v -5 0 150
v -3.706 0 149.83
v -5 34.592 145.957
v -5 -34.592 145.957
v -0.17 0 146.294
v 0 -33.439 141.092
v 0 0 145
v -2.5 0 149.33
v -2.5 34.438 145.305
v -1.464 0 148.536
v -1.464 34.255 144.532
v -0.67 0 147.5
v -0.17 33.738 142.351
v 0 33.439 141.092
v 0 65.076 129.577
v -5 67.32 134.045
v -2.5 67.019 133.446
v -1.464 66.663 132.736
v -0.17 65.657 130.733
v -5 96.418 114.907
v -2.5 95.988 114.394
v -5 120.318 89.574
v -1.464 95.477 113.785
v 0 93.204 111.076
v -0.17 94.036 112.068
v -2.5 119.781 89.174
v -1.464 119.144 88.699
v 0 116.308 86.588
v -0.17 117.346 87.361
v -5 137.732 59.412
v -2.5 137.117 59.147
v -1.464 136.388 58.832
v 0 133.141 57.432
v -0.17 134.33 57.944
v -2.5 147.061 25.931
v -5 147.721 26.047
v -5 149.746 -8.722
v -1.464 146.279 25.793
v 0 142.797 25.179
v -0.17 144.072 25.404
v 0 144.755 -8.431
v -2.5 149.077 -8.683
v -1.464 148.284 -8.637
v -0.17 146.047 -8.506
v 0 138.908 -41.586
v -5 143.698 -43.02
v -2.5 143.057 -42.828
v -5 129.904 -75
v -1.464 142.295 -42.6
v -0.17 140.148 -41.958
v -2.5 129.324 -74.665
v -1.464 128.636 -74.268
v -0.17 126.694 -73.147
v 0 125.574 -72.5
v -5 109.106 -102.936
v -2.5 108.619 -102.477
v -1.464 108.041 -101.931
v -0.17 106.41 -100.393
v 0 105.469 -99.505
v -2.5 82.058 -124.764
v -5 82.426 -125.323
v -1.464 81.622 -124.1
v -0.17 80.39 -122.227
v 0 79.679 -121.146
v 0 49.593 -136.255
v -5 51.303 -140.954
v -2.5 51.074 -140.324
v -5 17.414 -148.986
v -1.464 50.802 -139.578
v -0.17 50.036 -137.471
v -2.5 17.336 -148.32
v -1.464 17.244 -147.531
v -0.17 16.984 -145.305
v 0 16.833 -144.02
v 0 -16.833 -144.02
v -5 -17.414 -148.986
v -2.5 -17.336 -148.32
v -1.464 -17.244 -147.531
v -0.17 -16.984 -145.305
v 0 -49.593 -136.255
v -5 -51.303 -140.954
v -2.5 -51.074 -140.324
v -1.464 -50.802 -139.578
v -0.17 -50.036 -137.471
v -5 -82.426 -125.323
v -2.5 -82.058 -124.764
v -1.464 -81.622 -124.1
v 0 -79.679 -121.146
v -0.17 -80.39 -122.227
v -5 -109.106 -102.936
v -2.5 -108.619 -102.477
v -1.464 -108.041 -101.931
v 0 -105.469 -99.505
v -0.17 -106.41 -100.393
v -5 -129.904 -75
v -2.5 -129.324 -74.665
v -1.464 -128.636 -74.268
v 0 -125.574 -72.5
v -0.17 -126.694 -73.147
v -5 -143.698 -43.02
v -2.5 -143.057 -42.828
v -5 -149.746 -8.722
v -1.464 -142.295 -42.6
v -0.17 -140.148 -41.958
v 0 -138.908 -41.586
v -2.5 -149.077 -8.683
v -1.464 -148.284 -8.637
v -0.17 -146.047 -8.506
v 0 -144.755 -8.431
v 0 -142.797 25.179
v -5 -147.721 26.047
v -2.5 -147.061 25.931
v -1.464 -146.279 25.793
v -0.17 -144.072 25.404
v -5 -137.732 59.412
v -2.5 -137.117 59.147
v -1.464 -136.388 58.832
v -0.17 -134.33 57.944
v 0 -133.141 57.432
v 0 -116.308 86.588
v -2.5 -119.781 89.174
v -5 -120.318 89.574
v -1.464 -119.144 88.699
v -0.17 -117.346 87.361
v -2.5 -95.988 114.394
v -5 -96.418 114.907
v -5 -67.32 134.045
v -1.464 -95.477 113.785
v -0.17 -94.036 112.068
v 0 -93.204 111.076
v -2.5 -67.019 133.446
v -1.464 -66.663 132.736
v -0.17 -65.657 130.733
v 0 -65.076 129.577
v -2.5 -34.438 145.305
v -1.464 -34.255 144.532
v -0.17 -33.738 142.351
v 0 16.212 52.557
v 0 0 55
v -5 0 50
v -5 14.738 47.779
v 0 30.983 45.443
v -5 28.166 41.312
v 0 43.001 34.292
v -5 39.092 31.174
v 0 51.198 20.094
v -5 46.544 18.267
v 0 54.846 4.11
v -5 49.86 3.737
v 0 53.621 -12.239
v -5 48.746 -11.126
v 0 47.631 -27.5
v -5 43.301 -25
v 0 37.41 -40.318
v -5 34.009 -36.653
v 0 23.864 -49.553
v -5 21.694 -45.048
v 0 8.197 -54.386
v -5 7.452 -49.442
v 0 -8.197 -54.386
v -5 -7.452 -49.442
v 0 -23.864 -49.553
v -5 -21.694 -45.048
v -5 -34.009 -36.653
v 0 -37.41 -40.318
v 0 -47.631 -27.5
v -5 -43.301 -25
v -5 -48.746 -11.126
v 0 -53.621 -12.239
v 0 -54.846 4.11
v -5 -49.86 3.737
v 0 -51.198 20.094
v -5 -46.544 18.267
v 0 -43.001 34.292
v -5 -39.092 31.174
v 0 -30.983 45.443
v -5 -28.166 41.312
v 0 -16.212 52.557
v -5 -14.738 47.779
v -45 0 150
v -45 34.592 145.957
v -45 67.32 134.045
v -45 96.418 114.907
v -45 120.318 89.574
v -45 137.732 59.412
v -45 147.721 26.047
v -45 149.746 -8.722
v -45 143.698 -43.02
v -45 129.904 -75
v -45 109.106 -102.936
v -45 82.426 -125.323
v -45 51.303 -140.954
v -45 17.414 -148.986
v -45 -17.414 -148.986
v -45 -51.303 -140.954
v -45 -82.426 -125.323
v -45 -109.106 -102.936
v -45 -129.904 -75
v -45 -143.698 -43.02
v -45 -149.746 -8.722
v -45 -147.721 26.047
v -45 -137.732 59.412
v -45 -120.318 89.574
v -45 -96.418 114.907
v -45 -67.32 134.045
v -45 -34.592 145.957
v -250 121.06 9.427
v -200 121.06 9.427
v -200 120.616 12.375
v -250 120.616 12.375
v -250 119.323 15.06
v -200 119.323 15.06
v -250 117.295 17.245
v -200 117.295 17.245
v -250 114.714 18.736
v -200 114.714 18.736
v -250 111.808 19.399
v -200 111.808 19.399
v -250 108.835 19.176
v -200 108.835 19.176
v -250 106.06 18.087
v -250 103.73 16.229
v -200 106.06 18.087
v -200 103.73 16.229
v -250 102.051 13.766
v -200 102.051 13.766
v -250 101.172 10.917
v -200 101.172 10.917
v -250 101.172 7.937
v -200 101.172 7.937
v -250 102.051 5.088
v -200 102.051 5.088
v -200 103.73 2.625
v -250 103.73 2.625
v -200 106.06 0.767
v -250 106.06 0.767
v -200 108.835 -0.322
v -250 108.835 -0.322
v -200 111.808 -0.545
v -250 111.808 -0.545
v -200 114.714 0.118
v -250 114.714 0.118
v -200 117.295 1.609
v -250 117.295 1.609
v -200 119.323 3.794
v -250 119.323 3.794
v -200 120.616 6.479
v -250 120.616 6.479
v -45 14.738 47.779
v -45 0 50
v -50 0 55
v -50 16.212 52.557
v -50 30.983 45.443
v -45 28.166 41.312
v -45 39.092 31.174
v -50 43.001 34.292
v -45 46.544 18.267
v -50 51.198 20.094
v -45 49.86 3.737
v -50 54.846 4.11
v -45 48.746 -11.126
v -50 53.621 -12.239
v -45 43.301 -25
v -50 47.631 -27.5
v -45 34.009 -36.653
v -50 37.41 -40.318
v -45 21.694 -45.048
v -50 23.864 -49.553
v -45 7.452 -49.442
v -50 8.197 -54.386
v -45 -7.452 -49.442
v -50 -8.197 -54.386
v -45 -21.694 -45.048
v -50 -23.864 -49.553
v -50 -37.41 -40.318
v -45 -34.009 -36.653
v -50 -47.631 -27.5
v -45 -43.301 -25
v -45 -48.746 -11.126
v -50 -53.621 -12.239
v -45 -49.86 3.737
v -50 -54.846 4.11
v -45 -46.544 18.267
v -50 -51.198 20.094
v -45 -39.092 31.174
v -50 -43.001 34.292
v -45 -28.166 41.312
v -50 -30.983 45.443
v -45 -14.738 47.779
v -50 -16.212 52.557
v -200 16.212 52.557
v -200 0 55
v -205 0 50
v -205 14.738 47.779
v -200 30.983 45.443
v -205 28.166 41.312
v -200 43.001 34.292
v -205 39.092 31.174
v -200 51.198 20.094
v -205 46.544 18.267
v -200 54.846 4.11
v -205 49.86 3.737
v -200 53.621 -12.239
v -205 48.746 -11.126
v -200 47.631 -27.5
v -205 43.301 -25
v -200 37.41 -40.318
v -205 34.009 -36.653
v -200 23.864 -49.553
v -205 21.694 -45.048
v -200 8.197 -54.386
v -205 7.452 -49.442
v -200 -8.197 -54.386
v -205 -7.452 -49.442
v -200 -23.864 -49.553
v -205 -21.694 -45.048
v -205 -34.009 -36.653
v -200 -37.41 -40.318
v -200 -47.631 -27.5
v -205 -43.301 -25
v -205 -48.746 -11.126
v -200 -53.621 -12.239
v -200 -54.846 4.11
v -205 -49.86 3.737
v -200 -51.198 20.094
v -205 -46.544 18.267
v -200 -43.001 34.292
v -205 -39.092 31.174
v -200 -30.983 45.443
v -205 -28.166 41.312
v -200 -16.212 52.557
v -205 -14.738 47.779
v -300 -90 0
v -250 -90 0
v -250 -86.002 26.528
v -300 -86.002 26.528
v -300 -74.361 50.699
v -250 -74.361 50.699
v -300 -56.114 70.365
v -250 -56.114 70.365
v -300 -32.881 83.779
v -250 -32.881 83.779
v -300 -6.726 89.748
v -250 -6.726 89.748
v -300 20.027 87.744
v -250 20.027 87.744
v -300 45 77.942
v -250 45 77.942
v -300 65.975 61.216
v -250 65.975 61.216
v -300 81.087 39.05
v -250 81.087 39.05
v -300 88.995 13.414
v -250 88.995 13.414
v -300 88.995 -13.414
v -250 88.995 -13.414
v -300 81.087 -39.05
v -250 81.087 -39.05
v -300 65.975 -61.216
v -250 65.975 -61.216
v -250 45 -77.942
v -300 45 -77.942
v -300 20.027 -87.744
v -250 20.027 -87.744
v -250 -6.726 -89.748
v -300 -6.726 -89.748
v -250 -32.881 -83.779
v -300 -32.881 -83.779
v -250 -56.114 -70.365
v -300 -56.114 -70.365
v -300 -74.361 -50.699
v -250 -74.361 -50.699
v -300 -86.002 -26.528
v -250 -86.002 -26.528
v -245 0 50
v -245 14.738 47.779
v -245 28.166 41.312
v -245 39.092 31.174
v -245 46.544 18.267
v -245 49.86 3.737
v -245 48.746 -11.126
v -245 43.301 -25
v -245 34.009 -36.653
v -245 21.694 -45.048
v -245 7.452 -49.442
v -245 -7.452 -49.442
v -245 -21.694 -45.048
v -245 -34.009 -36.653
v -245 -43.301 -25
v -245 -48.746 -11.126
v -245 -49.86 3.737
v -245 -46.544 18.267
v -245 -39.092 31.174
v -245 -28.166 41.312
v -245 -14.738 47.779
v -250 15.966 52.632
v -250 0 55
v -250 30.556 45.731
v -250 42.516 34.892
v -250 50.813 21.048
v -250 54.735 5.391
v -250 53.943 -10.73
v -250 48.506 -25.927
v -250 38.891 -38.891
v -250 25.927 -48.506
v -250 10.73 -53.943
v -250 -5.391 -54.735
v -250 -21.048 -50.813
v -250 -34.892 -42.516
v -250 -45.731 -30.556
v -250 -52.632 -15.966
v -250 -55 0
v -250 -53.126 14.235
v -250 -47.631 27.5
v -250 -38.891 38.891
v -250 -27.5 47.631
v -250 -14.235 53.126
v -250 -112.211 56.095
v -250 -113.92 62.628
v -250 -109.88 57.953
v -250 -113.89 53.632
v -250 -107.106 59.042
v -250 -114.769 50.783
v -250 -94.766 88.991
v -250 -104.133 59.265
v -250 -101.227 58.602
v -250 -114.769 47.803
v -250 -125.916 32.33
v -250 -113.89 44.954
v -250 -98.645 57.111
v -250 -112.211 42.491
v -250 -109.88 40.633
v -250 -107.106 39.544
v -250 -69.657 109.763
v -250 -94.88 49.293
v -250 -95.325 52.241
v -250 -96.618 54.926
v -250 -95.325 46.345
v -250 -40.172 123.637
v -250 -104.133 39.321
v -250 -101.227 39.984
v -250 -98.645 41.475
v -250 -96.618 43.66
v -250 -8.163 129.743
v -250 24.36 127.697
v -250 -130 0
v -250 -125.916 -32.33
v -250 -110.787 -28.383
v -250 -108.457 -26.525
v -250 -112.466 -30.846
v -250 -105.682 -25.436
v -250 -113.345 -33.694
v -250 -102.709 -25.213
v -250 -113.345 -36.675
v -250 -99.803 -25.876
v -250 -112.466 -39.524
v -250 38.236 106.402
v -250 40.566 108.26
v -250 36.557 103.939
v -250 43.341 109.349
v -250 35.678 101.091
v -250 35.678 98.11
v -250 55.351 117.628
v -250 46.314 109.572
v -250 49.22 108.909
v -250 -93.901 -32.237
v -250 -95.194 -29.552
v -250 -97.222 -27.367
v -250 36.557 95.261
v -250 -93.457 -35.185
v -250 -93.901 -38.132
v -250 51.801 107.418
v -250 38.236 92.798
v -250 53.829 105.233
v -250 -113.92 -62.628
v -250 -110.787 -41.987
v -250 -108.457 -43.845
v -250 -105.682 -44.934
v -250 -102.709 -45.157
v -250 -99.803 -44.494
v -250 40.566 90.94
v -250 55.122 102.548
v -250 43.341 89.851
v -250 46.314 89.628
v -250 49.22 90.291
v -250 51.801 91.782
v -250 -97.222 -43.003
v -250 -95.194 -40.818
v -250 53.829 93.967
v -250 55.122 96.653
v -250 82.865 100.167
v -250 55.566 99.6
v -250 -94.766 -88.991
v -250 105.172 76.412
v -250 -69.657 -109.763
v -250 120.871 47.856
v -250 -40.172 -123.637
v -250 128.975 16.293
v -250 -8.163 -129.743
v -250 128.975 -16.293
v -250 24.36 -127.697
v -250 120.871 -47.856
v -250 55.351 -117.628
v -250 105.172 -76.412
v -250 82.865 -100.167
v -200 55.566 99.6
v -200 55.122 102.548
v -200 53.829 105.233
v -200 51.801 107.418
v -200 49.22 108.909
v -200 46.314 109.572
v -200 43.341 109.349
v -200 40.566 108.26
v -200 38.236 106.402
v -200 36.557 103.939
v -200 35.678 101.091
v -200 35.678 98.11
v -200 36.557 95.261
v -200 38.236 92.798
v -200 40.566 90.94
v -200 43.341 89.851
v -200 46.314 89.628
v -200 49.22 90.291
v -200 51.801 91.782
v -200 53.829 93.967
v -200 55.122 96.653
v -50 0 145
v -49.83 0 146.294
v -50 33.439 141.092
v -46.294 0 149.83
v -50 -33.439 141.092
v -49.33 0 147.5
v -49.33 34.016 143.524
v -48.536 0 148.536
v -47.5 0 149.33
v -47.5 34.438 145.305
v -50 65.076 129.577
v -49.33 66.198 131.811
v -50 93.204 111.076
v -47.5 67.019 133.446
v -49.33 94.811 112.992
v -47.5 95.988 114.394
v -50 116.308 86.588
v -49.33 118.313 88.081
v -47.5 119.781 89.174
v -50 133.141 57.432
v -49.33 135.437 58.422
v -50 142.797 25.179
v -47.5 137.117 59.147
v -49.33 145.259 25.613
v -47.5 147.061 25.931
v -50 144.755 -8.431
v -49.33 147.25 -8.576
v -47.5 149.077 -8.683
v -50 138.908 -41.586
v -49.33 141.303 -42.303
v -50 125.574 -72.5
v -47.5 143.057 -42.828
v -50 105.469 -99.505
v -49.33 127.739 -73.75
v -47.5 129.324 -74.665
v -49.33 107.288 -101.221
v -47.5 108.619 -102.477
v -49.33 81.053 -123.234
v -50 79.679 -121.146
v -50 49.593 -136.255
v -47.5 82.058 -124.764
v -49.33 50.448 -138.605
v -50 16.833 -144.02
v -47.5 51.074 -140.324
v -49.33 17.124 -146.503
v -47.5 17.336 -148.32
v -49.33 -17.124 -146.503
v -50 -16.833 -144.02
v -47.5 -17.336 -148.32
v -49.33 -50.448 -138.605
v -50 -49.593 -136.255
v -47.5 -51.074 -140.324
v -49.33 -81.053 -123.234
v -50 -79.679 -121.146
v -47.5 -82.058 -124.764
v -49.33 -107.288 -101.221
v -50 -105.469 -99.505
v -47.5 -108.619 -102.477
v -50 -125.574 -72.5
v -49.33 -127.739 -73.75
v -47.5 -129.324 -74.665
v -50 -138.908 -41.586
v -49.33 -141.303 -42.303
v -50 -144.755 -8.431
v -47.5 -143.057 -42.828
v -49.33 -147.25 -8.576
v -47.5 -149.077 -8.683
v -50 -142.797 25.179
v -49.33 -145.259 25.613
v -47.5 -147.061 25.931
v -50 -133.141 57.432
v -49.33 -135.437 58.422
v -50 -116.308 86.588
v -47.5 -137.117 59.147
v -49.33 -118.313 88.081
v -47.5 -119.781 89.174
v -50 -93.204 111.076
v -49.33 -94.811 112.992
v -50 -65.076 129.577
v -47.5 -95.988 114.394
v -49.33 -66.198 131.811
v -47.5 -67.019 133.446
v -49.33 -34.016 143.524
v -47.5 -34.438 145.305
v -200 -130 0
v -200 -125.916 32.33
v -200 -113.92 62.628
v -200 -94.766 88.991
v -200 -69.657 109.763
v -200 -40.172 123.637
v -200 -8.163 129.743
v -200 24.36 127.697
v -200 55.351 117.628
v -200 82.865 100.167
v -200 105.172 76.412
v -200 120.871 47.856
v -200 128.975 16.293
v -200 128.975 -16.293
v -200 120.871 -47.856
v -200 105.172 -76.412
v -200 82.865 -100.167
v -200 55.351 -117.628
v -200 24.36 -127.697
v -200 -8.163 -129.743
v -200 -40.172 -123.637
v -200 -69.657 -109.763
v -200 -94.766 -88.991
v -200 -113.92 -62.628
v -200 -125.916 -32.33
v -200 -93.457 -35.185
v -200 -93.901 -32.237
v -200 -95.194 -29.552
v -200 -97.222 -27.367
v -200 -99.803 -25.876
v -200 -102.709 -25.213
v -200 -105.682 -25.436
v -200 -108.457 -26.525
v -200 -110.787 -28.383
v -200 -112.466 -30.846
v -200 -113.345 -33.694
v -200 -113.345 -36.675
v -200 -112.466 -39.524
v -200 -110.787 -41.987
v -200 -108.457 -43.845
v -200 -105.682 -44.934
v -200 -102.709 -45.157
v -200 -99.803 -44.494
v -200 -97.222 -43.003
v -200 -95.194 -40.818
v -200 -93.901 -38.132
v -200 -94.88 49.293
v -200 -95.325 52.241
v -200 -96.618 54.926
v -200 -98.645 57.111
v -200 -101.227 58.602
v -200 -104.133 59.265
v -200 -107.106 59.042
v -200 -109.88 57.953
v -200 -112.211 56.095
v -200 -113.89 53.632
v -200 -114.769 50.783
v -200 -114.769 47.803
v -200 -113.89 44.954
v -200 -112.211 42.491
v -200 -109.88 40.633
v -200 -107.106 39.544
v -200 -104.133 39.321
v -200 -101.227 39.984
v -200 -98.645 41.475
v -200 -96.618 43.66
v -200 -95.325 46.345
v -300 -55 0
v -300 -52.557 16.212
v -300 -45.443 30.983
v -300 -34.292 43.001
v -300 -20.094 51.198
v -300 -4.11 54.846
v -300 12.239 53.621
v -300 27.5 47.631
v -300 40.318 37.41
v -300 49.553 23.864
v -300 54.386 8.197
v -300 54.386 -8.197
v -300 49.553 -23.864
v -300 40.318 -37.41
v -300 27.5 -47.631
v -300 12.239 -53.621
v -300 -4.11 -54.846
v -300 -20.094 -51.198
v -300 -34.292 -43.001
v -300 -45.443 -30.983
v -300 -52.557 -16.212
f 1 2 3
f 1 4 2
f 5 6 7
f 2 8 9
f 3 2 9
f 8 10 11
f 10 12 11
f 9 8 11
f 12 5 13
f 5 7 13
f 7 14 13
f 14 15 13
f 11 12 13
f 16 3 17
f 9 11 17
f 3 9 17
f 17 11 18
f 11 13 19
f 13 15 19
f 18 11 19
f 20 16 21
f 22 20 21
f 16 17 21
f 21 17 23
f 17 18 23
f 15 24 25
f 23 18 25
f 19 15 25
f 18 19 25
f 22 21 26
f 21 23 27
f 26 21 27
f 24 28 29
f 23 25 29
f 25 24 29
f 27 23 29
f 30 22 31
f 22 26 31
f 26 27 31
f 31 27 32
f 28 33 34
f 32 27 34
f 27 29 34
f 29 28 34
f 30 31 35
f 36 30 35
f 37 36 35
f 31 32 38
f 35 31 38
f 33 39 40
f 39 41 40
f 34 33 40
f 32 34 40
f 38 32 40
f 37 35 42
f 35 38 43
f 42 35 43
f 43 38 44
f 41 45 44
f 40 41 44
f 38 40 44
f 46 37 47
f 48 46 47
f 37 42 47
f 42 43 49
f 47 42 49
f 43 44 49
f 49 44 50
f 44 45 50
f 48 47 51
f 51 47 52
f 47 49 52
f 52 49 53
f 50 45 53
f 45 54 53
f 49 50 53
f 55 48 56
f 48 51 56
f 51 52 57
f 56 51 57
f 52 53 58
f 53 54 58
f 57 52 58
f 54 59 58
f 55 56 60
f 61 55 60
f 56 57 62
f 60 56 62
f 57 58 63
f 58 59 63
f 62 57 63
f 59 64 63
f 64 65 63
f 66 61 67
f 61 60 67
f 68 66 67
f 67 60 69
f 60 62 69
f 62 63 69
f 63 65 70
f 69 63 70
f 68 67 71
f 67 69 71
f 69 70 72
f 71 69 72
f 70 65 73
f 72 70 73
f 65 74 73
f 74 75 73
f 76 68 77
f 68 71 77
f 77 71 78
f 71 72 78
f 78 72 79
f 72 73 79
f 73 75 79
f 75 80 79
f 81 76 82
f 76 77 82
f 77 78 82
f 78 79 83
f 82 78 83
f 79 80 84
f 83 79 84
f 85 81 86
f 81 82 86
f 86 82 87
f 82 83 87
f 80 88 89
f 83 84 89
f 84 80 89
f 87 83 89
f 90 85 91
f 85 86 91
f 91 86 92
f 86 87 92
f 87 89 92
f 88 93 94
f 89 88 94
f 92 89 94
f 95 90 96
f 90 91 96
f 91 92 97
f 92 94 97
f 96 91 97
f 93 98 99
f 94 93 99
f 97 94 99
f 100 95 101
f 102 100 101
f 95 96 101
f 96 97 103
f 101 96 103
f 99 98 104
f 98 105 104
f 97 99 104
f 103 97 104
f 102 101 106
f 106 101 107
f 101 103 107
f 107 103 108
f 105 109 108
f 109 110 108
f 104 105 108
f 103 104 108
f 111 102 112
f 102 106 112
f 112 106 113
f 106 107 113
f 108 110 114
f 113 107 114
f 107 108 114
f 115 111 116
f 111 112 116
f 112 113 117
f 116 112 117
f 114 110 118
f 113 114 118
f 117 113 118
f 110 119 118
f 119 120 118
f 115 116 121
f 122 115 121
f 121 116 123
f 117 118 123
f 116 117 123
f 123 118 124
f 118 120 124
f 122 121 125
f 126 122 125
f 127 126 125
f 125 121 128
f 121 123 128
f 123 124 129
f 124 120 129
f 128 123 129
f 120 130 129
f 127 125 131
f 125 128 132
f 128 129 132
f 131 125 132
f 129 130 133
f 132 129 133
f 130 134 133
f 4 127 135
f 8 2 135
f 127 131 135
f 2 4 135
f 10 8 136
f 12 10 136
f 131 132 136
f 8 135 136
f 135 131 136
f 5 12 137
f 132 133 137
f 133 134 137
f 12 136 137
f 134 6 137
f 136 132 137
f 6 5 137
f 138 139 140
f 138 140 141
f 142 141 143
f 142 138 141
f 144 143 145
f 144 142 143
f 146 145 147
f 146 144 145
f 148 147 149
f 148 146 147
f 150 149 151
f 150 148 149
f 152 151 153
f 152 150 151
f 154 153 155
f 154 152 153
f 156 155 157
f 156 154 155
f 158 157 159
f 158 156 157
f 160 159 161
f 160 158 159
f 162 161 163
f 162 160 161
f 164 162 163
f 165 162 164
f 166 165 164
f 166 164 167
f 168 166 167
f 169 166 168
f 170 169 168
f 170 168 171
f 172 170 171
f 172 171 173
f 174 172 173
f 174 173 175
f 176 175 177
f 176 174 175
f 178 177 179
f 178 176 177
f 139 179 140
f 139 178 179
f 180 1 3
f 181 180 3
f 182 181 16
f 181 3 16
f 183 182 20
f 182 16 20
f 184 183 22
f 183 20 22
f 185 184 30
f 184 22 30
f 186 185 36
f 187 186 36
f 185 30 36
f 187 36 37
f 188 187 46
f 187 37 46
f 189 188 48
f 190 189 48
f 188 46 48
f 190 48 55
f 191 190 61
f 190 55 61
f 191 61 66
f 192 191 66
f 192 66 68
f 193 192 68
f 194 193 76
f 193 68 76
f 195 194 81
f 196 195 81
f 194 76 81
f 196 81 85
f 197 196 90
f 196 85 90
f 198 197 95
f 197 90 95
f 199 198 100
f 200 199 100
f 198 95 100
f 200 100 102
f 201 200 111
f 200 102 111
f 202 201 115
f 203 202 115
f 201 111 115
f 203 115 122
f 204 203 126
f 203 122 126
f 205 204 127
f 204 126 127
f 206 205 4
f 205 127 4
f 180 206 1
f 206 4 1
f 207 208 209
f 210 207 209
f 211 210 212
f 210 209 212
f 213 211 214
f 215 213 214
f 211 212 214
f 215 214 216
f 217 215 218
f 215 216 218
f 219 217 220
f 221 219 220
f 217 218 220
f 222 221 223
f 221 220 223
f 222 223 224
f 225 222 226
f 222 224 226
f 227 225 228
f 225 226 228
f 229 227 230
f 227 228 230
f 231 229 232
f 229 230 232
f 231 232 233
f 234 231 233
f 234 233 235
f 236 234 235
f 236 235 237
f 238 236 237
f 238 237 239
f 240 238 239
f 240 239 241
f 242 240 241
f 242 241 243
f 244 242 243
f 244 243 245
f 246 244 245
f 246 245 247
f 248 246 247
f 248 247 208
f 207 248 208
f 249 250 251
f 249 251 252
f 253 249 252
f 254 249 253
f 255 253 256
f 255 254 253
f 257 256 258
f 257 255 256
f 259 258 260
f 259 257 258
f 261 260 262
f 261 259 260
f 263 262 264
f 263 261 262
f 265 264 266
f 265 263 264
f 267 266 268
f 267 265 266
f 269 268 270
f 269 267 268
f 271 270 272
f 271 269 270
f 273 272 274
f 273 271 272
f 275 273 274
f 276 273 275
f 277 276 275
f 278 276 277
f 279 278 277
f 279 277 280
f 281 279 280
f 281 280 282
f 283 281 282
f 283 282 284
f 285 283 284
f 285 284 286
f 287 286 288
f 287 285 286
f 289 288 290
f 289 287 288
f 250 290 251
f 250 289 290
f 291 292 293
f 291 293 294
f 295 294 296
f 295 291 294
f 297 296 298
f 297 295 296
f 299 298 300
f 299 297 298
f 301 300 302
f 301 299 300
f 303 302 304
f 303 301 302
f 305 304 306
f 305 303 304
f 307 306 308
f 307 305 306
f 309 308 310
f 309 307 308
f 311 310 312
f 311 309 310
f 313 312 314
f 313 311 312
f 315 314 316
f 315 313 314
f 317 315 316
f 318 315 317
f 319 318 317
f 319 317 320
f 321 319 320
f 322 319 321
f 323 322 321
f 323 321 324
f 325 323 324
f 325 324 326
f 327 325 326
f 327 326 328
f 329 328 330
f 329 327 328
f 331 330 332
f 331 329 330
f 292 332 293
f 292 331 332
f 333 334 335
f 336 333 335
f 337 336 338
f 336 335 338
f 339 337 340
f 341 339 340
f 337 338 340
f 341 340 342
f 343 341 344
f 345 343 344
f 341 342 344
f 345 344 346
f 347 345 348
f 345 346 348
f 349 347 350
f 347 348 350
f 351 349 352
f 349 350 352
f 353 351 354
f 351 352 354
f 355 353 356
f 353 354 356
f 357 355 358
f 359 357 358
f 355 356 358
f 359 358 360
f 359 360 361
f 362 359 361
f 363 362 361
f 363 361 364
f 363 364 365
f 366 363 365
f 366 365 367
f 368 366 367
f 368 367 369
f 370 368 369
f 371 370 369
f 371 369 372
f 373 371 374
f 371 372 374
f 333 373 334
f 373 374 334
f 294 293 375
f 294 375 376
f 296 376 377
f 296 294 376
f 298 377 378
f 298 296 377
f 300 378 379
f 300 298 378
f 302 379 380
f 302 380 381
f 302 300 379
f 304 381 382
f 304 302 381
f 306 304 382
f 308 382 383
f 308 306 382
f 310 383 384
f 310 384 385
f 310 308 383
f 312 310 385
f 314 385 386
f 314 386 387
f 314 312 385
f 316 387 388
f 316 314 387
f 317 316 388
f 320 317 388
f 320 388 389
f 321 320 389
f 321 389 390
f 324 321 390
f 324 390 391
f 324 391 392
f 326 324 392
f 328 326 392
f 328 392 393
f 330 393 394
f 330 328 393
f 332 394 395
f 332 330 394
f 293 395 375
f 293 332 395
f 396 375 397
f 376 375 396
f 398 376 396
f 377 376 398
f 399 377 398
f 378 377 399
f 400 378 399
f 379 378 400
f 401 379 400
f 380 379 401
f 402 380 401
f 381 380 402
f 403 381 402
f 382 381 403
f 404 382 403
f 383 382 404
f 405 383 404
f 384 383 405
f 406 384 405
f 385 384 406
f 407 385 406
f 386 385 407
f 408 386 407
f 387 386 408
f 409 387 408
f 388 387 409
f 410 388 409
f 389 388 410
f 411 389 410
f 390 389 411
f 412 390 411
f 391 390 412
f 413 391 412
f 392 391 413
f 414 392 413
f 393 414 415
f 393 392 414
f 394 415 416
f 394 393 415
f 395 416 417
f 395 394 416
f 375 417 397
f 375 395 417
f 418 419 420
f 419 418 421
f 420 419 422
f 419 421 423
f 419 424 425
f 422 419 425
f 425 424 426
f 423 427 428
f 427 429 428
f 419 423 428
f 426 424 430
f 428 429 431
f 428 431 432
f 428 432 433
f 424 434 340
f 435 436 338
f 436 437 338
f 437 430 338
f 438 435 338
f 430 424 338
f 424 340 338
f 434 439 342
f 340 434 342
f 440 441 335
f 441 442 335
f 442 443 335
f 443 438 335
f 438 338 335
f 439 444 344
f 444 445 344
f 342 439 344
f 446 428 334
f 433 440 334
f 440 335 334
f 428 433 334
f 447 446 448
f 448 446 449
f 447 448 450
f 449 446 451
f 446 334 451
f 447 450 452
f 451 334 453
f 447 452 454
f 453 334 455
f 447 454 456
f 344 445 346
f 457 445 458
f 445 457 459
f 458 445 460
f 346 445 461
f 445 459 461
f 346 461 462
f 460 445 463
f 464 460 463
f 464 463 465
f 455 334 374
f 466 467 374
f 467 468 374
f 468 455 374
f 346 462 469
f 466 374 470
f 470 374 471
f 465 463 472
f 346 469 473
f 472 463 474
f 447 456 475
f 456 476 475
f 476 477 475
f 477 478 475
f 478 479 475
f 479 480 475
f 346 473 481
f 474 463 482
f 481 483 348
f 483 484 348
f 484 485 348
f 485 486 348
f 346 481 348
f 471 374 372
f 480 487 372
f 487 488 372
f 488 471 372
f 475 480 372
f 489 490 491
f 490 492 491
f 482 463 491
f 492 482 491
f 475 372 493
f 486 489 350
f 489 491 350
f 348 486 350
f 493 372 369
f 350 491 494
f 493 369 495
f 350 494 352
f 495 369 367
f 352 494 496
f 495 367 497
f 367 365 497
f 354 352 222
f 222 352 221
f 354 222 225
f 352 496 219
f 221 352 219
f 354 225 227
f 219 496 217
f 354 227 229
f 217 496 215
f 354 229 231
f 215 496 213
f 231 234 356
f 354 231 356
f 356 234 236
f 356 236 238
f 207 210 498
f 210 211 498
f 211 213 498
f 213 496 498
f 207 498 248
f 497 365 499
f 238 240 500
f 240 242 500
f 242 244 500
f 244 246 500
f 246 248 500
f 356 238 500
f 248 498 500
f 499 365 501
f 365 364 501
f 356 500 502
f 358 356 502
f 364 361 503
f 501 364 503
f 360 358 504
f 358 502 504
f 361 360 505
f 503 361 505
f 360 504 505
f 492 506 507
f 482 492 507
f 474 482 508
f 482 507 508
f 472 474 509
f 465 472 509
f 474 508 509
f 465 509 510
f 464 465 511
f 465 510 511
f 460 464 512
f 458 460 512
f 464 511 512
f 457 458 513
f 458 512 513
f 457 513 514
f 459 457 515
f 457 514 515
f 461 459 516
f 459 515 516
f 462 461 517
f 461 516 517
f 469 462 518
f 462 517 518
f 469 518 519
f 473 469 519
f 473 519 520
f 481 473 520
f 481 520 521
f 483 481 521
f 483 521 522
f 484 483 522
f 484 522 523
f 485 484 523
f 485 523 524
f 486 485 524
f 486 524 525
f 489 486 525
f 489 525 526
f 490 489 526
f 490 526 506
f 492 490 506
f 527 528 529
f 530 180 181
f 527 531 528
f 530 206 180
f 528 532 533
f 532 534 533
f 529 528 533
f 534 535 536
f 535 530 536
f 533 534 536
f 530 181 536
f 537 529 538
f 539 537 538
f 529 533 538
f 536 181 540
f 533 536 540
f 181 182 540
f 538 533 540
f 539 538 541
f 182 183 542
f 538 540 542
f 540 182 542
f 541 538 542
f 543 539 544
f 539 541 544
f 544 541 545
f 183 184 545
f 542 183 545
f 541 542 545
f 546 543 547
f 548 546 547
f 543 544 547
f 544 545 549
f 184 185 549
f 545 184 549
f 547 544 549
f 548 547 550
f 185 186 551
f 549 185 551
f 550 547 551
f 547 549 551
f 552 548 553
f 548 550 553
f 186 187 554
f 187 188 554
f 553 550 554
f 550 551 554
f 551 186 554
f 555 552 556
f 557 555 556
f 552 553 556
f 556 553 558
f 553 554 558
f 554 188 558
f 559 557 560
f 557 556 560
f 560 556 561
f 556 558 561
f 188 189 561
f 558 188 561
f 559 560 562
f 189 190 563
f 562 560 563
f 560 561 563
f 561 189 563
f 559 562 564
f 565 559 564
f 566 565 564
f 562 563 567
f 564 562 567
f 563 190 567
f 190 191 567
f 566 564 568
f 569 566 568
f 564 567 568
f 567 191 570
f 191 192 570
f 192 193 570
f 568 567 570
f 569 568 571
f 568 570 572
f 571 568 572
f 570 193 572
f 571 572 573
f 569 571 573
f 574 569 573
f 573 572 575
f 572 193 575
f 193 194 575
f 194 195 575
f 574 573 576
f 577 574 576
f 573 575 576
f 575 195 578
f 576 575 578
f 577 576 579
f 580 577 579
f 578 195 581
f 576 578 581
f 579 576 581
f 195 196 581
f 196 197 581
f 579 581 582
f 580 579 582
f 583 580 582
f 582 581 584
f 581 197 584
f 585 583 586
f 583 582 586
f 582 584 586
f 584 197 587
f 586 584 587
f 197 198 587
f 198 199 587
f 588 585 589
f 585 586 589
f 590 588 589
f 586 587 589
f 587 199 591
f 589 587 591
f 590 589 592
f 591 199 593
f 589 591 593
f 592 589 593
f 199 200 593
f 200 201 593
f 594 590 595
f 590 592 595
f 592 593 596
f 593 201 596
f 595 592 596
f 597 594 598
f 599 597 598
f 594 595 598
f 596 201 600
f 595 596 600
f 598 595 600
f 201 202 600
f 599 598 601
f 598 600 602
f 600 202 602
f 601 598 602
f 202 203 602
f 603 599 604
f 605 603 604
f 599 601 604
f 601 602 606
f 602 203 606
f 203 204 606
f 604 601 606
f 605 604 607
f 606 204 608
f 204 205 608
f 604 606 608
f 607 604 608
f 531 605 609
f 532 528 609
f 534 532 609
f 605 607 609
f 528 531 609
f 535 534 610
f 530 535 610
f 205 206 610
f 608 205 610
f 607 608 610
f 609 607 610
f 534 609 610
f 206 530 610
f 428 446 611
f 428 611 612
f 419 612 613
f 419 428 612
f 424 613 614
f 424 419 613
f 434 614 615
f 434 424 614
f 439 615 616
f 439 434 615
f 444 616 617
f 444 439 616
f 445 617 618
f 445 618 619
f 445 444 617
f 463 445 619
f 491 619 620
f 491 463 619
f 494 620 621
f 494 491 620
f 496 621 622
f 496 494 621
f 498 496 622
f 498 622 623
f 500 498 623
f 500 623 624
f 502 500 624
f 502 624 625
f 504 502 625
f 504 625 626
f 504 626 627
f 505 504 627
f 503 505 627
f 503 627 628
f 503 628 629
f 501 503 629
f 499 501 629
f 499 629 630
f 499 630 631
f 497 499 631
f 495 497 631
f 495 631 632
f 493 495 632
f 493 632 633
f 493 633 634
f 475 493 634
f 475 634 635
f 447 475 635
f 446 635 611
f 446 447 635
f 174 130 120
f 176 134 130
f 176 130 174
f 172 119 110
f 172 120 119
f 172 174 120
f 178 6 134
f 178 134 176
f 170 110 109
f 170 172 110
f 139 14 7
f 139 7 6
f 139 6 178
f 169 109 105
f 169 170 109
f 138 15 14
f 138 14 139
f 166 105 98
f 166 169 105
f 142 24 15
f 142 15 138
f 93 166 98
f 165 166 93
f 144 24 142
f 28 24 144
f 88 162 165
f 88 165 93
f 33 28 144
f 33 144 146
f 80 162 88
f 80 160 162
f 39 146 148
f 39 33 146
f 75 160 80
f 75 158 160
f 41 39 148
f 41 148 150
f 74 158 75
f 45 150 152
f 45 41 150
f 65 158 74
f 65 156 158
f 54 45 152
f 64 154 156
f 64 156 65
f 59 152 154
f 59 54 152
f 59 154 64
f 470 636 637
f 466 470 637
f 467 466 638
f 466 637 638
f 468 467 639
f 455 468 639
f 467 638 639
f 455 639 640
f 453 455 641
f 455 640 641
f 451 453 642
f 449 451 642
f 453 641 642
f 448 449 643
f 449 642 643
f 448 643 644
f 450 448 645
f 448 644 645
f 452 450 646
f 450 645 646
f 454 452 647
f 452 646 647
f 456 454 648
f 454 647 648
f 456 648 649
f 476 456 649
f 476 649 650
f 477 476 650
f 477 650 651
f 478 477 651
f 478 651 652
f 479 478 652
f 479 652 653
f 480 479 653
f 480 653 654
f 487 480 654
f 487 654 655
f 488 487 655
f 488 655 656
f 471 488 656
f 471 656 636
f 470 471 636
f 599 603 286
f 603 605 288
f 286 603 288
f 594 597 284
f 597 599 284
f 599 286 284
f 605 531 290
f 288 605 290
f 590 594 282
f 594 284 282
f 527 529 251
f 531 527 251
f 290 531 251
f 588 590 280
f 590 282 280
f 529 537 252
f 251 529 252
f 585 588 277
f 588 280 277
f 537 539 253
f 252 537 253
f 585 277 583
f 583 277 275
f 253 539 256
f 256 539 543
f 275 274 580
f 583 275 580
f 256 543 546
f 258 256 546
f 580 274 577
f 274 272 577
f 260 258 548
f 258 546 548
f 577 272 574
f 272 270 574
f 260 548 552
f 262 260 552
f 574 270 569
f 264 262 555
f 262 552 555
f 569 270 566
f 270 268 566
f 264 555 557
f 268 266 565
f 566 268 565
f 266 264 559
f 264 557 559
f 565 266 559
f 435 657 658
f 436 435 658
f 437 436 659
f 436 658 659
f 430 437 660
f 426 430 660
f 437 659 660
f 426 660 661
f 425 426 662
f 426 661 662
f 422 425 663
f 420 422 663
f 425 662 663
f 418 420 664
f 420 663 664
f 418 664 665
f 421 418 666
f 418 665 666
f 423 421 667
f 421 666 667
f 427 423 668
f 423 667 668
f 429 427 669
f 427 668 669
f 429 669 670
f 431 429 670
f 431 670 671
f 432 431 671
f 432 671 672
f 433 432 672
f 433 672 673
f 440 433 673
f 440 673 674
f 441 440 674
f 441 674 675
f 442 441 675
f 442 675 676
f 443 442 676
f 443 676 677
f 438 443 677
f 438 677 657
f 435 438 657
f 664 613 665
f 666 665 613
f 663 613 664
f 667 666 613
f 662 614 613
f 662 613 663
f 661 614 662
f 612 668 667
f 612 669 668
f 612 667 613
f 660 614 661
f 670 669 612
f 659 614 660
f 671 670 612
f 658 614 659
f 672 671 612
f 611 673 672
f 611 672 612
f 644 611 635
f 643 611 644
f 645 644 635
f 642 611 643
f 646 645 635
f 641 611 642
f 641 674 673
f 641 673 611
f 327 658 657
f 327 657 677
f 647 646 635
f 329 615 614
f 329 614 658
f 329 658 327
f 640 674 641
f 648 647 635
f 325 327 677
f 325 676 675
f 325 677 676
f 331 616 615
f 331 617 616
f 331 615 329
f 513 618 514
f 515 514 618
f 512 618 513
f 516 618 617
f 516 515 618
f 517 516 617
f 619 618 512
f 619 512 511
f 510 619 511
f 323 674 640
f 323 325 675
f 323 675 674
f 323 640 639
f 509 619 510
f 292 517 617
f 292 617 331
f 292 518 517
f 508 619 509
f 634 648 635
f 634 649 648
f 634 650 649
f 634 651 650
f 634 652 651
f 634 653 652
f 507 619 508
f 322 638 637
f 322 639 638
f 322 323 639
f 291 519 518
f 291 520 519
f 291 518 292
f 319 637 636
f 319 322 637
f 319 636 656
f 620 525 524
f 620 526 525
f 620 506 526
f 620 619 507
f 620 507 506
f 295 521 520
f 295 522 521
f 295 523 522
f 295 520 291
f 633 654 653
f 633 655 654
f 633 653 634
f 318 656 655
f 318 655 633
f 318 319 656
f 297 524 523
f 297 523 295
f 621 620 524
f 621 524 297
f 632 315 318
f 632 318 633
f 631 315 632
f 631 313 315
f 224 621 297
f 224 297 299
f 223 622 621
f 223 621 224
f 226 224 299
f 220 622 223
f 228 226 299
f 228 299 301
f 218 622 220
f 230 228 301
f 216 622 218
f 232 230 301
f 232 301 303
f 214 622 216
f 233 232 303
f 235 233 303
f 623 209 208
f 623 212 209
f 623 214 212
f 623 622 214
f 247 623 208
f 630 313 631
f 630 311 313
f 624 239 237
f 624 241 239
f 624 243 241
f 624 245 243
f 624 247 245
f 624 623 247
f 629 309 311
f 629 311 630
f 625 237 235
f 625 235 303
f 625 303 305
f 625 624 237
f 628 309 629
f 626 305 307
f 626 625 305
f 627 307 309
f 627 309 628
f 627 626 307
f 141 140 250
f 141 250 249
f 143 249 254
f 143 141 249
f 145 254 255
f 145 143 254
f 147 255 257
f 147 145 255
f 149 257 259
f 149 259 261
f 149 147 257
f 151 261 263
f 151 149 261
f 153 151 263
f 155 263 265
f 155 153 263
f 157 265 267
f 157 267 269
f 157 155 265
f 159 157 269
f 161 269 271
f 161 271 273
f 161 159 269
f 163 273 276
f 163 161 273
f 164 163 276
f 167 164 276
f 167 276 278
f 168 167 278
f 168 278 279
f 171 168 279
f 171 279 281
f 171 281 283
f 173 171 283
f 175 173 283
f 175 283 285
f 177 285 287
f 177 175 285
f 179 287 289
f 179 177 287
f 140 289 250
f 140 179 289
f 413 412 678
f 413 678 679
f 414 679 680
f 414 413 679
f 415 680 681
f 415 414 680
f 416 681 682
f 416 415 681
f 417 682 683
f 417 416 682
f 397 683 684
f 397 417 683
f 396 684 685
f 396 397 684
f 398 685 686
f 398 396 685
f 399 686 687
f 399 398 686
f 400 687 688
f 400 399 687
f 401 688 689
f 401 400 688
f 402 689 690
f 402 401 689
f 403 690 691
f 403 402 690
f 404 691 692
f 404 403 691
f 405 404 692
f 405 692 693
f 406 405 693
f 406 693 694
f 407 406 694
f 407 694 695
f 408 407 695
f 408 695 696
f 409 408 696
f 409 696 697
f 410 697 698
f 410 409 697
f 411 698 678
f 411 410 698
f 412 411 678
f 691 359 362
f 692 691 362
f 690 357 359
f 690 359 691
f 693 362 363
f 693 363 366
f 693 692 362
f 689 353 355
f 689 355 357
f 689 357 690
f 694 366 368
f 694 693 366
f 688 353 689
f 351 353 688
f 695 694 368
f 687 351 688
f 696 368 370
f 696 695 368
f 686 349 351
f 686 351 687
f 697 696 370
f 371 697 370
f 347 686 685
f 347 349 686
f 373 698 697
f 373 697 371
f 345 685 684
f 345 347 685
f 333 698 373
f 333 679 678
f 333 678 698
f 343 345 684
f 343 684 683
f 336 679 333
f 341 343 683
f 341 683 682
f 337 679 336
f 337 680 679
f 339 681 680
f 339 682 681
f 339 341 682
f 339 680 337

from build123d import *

# Parameters (mm, degrees)
F0_W     = 50
F0_H     = 100
F2_SIZE  = 5
F3_R     = 5
F5_R     = 90
F5_R_2   = 55
F6_DEPTH = 50
F5_R_3   = 175
F5_R_4   = 145
F5_R_5   = 130
F7_DEPTH = 250.001
F8_D     = 20


with BuildPart() as f1:
    # F0 (on Front) → F1 (revolve)
    with BuildSketch(Plane.XZ):
        with Locations((-25, 100)):
            Rectangle(F0_W, F0_H)
    revolve(axis=Axis((-17.4827627066, 0, 0), (-1, 0, 0)))

    # F2
    f2_edges = [f1.edges().sort_by_distance(p)[0] for p in [
        (-50, 0, -50),
        (0, 0, -50),
        (-25, 0, 50),
    ]]
    chamfer(f2_edges, length=F2_SIZE)

    # F3
    f3_edges = [f1.edges().sort_by_distance(p)[0] for p in [
        (0, 0, -150),
        (-50, 0, -150),
        (-25, 0, 150),
    ]]
    fillet(f3_edges, radius=F3_R)


with BuildPart() as f4_1:
    # F4: copy of F1
    add(f1.part.moved(Location((-200, 0, 0))))

    # F5 (on face) → F6 (join)
    with BuildSketch(Plane(origin=(-250, 0, 0), x_dir=(0, -1, 0), z_dir=(-1, 0, 0))):
        Circle(F5_R)
        Circle(F5_R_2, mode=Mode.SUBTRACT)
    extrude(amount=F6_DEPTH)

    # F5 (on face) → F7 (cut, through all)
    with BuildSketch(Plane(origin=(-250, 0, 0), x_dir=(0, -1, 0), z_dir=(-1, 0, 0))):
        Circle(F5_R_3)
        Circle(F5_R_4, mode=Mode.SUBTRACT)
        Circle(F5_R_4)
        Circle(F5_R_5, mode=Mode.SUBTRACT)
    extrude(amount=-F7_DEPTH, mode=Mode.SUBTRACT)

    # F8 (through all)
    with Locations(Plane(origin=(-250, 0, 0), x_dir=(0, -1, 0), z_dir=(-1, 0, 0))):
        with Locations((-45.5663353205, 99.6001213789), (-111.0604554415, 9.4270482659), (104.8803180456, 49.293037504), (103.4565344453, -35.1848937571)):
            Hole(F8_D / 2)


solid = Compound([f1.part, f4_1.part])
